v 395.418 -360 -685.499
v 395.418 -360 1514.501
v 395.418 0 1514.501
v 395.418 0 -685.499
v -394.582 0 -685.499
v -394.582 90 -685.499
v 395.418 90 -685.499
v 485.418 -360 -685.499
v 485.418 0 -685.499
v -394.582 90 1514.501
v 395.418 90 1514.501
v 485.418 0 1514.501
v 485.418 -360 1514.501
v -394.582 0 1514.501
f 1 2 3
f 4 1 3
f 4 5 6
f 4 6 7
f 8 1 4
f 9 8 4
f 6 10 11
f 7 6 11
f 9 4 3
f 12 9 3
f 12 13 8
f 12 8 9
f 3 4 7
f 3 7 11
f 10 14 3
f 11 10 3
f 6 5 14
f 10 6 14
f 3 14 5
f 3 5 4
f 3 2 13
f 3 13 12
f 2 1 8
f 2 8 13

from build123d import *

# Parameters (mm, degrees)
F0_W     = 790
F0_H     = 2200
F1_DEPTH = 90
F3_W     = 360
F3_H     = 2200
F4_DEPTH = 90


with BuildPart() as f1:
    # F0 (on Front) → F1 (new body)
    with BuildSketch(Plane.XZ):
        with Locations((0.417999, 414.500552)):
            Rectangle(F0_W, F0_H)
    extrude(amount=-F1_DEPTH)


with BuildPart() as f4:
    # F3 (on face) → F4 (new body)
    with BuildSketch(Plane.YZ.offset(395.417999)):
        with Locations((-180, 414.500552)):
            Rectangle(F3_W, F3_H)
    extrude(amount=F4_DEPTH)


solid = Compound([f1.part, f4.part])
